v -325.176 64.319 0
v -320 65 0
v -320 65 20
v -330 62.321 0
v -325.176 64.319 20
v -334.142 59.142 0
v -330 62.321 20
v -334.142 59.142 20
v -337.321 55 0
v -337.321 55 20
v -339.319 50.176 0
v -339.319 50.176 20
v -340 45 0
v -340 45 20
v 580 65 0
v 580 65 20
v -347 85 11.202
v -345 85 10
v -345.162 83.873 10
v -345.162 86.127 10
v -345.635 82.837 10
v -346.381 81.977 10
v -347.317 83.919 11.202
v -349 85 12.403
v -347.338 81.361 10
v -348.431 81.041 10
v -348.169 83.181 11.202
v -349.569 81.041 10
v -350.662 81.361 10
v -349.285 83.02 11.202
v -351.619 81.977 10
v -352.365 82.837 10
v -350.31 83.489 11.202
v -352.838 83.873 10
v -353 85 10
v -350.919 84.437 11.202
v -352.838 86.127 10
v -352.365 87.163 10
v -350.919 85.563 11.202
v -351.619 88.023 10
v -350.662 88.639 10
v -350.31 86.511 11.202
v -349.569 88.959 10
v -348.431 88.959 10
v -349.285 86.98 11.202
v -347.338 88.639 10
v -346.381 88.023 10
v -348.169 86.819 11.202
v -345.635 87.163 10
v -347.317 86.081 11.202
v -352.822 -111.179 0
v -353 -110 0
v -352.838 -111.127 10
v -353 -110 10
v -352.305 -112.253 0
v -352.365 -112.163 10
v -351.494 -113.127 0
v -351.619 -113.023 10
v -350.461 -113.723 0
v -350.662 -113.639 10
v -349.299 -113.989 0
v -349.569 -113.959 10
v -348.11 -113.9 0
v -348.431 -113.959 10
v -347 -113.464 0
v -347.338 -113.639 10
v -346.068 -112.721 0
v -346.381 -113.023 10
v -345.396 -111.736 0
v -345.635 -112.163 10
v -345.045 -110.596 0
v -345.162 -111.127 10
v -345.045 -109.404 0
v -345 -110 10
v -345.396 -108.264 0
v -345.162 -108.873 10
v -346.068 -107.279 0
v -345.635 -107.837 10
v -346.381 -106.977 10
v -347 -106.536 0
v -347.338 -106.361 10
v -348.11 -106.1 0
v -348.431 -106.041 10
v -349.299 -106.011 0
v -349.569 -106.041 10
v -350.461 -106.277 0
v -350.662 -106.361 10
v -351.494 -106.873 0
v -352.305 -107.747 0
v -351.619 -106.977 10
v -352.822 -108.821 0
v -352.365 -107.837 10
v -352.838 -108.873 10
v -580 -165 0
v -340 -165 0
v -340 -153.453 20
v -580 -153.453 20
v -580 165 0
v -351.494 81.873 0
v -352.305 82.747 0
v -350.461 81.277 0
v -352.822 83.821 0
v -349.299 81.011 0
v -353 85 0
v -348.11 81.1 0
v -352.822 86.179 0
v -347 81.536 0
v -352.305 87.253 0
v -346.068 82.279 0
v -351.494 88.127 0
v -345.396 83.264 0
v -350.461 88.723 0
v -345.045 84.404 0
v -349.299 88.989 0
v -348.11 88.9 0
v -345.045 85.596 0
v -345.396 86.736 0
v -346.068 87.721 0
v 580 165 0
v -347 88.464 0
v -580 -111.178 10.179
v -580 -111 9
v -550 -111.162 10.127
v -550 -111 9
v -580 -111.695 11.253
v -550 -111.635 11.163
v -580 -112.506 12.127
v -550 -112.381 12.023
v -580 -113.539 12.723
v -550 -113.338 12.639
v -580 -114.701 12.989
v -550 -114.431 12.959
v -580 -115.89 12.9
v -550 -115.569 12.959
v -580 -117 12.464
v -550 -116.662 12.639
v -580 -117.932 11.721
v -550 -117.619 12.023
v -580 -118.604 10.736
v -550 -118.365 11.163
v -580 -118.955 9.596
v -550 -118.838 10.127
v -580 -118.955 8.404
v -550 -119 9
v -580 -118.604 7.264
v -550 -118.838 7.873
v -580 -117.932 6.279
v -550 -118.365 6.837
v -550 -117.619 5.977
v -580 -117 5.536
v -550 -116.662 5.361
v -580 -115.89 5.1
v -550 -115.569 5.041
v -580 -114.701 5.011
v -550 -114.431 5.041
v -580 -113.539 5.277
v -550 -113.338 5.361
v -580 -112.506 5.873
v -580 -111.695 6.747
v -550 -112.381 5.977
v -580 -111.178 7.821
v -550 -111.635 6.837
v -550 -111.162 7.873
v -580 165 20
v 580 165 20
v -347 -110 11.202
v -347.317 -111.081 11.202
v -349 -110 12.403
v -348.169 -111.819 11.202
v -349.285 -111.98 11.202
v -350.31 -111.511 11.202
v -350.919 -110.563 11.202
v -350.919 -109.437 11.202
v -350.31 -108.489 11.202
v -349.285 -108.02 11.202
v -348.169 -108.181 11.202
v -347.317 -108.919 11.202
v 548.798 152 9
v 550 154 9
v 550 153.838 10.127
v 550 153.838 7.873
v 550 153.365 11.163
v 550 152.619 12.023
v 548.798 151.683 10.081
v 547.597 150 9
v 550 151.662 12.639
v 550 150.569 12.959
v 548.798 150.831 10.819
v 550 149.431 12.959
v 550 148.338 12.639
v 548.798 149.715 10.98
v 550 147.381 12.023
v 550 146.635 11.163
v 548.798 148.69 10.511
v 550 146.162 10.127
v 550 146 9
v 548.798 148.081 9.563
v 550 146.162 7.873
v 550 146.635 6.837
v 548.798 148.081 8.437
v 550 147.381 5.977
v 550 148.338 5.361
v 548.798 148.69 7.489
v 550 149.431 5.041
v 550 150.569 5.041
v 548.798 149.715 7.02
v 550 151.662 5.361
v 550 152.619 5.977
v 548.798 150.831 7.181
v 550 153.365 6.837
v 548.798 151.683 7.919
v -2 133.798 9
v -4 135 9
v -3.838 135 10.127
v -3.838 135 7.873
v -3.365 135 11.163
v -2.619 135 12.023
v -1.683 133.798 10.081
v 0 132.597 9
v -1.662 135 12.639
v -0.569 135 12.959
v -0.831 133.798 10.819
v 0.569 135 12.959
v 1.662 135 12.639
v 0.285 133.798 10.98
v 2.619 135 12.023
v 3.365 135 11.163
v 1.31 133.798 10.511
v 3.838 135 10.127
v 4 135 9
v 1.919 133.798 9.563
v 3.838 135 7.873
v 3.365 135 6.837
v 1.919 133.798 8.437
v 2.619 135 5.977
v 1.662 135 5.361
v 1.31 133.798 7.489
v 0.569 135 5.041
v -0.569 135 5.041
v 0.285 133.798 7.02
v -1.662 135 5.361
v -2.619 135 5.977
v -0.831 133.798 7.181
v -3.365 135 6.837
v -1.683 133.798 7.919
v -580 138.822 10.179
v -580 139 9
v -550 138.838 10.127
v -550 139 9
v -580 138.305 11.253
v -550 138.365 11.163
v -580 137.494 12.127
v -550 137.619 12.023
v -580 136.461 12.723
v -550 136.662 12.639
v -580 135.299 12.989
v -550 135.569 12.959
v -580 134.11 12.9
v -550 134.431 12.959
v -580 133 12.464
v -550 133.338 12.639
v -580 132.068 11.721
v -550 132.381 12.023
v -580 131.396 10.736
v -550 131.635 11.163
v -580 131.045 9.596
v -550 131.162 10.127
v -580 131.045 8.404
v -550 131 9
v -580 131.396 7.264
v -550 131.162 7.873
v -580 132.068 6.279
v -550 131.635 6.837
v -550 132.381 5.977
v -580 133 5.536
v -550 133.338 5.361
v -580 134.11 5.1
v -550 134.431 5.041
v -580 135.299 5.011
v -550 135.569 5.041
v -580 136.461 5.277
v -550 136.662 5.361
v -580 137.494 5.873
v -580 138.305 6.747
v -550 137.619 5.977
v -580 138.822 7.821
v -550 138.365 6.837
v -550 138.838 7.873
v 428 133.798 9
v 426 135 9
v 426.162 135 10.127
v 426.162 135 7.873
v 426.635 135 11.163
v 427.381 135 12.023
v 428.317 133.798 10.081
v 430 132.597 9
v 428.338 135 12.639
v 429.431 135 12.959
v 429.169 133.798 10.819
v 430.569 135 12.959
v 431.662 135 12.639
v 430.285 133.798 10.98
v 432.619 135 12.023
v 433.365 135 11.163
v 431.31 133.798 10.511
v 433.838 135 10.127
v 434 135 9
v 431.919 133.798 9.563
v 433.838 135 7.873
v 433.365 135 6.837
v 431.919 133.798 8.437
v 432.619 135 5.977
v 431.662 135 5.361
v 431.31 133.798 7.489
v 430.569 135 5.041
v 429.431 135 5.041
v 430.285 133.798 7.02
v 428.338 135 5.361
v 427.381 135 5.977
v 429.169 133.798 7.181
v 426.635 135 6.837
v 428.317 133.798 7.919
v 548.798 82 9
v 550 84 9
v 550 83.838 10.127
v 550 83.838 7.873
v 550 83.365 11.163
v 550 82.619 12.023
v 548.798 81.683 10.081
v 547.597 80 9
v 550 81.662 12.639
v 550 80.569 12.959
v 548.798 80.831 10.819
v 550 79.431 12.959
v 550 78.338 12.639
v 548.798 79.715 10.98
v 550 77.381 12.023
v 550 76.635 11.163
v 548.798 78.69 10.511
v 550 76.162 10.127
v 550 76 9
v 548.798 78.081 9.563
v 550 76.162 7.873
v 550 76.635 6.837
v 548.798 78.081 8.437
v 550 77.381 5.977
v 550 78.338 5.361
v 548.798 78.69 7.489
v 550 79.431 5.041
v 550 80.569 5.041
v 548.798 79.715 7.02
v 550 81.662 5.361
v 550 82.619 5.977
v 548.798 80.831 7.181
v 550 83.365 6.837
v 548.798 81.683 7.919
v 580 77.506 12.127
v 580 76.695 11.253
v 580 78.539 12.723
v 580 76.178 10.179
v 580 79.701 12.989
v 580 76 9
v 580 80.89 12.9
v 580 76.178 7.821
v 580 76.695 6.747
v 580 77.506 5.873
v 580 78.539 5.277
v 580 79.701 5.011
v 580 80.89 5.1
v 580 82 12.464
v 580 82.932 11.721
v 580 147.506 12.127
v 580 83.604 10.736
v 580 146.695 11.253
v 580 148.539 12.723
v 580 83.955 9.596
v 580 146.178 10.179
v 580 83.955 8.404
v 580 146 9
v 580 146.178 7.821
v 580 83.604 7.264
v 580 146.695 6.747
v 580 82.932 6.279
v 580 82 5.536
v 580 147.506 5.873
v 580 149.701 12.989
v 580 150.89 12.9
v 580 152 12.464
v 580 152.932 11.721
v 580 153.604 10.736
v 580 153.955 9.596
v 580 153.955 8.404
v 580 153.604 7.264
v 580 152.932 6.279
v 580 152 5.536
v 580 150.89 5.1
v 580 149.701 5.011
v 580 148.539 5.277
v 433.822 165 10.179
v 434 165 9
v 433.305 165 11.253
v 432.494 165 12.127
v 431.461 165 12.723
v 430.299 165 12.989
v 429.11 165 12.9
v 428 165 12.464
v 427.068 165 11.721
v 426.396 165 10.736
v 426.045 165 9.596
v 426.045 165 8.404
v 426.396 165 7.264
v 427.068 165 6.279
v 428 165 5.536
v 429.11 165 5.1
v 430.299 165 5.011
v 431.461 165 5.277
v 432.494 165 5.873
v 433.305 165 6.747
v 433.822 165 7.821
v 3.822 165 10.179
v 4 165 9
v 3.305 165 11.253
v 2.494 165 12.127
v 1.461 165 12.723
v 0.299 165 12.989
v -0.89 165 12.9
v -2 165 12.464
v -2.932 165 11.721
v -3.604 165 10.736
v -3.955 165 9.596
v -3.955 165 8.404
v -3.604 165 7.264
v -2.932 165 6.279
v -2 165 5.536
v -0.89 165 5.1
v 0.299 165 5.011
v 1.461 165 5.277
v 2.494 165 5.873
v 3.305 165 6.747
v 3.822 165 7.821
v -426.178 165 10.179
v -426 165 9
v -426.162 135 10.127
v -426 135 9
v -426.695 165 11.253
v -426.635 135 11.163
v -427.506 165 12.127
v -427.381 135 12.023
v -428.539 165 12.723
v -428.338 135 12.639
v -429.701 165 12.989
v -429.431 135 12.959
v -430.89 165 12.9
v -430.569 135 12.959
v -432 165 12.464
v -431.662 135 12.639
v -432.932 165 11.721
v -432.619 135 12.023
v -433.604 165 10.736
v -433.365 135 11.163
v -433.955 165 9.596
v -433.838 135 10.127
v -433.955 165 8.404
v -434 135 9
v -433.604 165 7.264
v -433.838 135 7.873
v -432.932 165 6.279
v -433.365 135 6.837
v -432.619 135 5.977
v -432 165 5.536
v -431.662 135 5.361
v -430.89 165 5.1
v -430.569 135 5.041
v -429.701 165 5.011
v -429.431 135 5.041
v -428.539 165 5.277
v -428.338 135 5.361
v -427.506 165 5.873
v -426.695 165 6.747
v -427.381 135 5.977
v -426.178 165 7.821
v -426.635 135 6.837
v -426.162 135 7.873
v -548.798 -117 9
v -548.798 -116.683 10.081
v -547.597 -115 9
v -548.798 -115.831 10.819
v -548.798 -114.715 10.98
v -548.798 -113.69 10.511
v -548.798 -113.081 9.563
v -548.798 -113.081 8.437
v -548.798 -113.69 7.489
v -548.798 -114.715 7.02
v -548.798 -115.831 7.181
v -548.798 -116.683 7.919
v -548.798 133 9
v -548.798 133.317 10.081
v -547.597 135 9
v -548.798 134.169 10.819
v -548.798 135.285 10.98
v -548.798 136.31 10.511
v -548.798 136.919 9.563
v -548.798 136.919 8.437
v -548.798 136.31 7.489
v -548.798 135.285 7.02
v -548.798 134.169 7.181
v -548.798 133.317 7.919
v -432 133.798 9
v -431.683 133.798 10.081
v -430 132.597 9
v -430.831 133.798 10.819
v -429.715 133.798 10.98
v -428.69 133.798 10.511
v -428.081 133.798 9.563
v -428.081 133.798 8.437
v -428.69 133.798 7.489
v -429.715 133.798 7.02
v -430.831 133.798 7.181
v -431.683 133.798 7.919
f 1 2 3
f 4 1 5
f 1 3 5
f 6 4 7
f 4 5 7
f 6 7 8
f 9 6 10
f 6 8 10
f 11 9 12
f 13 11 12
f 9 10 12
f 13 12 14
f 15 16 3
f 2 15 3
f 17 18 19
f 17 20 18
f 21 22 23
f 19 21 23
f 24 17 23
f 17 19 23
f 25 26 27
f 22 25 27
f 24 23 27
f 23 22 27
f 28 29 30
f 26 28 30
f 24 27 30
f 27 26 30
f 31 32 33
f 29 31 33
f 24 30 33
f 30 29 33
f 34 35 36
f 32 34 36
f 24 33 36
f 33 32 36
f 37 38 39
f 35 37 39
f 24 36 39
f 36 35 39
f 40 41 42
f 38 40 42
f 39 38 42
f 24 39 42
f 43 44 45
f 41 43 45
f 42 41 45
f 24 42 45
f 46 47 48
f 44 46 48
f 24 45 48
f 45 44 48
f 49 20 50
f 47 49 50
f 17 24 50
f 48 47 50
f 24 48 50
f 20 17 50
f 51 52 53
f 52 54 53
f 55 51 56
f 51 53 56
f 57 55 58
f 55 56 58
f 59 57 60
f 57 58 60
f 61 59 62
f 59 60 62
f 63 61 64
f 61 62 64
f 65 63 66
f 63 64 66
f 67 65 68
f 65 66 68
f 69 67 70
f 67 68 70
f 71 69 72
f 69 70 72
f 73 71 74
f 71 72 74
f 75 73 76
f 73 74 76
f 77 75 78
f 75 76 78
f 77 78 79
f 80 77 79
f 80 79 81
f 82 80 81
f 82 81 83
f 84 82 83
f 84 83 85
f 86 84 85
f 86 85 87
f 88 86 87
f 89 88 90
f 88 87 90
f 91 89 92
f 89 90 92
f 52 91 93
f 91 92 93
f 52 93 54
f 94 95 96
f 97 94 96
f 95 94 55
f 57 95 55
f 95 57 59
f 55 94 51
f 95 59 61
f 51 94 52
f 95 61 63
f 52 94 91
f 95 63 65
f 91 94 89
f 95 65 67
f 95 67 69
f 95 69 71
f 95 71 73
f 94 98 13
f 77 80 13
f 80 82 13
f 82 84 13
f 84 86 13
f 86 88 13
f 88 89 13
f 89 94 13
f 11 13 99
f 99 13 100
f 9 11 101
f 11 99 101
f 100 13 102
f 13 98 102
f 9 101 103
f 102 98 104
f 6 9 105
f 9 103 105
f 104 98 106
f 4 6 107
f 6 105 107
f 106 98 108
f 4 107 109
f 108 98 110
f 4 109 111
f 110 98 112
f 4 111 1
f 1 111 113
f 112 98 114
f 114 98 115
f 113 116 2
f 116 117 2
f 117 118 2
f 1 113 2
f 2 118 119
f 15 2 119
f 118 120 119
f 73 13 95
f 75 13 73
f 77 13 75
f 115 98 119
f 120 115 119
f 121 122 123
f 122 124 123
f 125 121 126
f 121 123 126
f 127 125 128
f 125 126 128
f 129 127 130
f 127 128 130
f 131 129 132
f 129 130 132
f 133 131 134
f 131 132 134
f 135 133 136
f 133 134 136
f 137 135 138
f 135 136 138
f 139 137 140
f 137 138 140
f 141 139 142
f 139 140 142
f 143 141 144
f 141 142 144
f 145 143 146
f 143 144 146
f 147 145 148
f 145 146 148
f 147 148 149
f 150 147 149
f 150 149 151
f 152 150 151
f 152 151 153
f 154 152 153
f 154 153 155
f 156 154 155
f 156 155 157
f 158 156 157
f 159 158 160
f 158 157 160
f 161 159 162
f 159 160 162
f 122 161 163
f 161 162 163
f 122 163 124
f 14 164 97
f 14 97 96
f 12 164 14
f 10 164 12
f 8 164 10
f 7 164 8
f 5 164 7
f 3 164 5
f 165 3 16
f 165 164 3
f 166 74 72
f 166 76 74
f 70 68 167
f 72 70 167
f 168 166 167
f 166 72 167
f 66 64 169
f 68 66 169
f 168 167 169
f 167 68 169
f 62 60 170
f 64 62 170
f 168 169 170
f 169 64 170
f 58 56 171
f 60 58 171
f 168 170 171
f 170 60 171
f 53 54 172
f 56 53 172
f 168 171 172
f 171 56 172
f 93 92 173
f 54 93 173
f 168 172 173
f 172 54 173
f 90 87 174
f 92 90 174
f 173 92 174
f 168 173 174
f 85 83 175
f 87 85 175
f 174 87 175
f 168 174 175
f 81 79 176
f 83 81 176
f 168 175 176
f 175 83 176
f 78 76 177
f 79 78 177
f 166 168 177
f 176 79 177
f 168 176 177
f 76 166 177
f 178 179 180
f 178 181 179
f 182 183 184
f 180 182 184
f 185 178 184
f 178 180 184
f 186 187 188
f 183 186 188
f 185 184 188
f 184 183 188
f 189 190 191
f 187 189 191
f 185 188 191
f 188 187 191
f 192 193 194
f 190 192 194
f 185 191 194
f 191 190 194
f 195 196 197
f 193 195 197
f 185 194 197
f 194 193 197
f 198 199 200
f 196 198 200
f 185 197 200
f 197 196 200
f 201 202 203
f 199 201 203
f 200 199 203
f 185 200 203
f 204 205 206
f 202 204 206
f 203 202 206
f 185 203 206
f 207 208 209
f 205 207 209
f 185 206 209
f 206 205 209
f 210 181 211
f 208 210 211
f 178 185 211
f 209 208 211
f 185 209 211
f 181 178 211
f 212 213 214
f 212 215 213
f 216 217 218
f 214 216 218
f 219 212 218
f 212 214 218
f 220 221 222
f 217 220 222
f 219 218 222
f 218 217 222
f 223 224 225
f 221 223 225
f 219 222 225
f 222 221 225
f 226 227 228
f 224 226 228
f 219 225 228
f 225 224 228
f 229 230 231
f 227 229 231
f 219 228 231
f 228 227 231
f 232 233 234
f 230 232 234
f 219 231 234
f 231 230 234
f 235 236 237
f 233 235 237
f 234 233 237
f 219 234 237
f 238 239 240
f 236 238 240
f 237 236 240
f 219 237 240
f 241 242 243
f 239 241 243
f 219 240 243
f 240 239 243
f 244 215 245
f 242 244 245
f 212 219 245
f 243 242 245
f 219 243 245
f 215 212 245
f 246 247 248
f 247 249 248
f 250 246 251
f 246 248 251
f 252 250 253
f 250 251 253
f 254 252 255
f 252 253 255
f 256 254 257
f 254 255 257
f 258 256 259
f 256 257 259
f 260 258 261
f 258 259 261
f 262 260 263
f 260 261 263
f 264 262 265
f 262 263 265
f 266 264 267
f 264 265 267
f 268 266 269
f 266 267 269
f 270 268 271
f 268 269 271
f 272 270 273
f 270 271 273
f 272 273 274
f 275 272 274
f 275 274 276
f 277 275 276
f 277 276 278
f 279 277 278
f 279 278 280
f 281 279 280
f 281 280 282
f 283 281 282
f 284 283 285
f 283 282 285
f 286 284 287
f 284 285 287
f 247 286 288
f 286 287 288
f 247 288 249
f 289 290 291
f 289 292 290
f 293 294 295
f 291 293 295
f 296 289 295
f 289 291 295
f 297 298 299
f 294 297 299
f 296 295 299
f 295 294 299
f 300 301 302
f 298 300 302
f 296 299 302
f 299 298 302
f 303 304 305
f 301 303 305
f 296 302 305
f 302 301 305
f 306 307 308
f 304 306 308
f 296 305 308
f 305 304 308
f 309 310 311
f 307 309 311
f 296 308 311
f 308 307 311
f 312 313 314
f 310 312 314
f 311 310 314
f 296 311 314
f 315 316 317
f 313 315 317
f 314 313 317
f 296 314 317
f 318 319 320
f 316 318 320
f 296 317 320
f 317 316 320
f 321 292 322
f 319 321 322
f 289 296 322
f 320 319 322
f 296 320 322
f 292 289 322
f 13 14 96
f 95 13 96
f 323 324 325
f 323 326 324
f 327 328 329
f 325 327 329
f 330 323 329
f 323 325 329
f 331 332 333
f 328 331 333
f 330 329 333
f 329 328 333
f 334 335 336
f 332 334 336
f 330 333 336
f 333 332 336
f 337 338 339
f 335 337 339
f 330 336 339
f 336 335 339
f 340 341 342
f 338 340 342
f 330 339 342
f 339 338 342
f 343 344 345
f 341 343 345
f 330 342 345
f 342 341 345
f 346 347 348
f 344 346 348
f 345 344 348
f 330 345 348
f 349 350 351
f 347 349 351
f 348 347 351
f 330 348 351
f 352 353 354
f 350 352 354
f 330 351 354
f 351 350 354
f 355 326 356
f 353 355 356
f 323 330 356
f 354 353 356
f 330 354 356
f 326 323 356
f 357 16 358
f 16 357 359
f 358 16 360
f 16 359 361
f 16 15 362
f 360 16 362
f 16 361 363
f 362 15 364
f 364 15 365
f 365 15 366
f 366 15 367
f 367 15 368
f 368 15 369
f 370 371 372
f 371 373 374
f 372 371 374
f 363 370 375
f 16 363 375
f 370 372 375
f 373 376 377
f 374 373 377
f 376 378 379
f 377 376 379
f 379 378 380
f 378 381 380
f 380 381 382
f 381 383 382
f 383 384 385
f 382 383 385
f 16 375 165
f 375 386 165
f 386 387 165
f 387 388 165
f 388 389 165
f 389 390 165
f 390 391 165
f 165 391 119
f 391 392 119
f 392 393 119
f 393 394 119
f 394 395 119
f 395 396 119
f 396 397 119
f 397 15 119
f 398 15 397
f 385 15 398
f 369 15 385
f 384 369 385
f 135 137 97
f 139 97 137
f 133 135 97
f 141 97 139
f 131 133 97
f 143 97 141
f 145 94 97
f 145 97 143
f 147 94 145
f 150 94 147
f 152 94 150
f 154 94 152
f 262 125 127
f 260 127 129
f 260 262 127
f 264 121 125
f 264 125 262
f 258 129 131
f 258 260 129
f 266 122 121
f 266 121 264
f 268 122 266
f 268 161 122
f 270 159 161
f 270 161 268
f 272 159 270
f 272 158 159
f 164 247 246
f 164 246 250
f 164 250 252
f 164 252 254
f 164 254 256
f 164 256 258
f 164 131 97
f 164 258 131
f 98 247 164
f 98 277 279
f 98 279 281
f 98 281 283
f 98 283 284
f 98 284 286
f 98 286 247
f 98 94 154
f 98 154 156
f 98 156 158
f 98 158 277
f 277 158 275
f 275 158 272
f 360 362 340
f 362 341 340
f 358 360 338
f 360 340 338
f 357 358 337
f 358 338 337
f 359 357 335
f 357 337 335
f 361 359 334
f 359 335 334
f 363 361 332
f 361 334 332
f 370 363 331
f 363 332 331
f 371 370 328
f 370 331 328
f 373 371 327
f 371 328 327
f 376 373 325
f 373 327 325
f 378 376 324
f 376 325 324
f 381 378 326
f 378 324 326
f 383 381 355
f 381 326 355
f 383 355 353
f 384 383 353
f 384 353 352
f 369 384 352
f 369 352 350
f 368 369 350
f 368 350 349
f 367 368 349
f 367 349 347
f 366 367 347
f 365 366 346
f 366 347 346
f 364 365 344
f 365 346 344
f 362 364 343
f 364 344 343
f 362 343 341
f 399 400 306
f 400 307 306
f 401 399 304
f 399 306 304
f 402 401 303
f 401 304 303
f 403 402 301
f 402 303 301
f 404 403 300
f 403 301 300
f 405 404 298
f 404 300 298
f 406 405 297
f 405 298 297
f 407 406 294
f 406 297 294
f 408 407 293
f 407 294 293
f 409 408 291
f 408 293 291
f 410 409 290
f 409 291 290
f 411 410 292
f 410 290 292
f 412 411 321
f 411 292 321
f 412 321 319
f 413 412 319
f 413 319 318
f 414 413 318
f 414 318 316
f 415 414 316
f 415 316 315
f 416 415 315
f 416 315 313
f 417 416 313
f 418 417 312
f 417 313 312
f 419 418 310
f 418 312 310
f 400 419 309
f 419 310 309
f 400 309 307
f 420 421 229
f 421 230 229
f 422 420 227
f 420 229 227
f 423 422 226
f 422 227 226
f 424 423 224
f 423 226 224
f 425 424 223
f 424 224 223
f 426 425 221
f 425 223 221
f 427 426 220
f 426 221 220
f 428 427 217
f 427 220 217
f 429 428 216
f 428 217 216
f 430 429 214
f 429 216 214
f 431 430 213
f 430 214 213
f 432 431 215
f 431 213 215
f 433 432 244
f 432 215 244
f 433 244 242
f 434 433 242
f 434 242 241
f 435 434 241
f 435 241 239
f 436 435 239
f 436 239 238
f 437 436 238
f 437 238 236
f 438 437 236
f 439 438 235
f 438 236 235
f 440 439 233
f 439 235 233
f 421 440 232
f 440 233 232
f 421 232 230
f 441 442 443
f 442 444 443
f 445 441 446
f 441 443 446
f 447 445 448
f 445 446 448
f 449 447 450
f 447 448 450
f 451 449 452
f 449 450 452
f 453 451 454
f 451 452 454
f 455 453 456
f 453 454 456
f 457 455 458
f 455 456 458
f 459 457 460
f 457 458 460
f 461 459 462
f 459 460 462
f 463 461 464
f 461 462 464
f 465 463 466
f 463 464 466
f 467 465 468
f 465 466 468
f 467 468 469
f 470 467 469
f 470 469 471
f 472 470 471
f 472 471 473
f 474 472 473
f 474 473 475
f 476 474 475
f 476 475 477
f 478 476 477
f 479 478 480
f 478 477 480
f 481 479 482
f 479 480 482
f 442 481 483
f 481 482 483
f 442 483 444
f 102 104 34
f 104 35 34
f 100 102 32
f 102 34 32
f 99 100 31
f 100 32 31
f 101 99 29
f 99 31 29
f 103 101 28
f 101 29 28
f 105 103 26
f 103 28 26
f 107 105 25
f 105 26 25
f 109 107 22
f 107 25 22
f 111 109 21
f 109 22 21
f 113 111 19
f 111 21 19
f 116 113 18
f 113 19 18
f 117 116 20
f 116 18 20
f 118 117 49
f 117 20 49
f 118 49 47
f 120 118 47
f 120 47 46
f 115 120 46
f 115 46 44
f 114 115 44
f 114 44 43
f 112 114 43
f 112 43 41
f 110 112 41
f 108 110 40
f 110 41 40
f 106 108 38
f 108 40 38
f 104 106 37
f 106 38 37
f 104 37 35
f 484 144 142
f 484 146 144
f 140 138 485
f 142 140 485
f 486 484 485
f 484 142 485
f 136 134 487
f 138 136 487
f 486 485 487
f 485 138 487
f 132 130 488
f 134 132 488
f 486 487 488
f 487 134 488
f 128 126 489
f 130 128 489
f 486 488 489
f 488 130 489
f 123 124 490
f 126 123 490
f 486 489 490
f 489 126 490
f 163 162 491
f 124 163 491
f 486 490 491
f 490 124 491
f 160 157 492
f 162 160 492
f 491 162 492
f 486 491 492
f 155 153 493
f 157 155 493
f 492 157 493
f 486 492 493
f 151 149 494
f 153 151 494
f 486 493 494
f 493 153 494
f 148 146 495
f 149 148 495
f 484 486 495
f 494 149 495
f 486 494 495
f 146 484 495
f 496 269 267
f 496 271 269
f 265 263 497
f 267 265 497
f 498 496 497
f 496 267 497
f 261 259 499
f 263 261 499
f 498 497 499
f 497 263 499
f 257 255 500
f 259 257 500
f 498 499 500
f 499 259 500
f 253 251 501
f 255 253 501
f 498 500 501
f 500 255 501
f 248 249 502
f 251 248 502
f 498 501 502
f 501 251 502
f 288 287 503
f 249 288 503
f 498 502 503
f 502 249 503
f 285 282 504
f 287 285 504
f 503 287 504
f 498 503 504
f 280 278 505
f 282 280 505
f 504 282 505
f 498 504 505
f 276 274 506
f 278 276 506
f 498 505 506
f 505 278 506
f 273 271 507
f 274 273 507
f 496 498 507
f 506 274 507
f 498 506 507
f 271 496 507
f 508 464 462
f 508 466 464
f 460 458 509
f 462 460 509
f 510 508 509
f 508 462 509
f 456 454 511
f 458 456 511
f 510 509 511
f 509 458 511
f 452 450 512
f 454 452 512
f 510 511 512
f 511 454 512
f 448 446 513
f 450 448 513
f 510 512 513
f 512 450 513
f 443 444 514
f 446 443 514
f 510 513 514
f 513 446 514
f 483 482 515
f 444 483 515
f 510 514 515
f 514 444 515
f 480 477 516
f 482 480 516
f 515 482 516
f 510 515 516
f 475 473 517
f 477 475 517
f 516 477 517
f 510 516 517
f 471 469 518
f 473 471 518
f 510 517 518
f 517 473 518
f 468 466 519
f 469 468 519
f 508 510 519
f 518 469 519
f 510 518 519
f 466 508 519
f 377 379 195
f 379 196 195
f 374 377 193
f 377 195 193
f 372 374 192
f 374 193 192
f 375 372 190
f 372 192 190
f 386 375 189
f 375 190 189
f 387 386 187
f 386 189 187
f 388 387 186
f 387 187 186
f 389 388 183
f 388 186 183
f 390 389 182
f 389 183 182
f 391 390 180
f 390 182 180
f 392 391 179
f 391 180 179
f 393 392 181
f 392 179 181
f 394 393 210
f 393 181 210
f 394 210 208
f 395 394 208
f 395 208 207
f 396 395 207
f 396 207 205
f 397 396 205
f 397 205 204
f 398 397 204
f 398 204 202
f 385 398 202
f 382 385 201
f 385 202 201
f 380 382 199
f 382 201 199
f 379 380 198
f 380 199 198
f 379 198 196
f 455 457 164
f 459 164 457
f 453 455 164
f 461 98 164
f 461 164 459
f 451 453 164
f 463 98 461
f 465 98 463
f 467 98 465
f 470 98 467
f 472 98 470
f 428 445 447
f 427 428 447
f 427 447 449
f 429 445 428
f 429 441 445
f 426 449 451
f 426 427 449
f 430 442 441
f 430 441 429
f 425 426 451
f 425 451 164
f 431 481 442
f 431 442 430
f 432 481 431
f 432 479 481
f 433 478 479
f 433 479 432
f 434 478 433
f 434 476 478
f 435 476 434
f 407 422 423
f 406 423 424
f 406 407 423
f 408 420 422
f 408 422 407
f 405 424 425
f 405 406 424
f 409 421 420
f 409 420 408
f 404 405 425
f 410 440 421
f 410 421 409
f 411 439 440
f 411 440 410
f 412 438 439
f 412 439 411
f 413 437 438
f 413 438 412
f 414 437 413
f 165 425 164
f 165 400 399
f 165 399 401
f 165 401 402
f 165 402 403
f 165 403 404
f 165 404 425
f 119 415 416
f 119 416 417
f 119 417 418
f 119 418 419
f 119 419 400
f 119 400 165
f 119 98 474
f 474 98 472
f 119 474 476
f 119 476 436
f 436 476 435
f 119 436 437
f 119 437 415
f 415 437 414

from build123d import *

# Parameters (mm, degrees)
F0_W            = 1160
F0_H            = 330
F1_DEPTH        = 20
F3_DEPTH        = 20.001
F5_DEPTH        = 580.001
F10_D           = 8
F10_DEPTH       = 30
F10_TIP         = 2.4034424761
F10_ON_F7_D     = 8
F10_ON_F7_DEPTH = 30
F10_ON_F7_TIP   = 2.4034424761
F10_ON_F8_D     = 8
F10_ON_F8_DEPTH = 30
F10_ON_F8_TIP   = 2.4034424761
F11_D           = 8
F11_DEPTH       = 10
F11_TIP         = 2.4034424761


with BuildPart() as f1:
    # F0 (on Top) → F1 (new body)
    with BuildSketch(Plane.XY):
        Rectangle(F0_W, F0_H)
    extrude(amount=F1_DEPTH)

    # F2 (on face) → F3 (cut, through all)
    with BuildSketch(Plane.XY.offset(20)):
        with BuildLine():
            Line((-340, 45), (-340, -165))
            Line((-340, -165), (580, -165))
            Line((580, -165), (580, 65))
            Line((580, 65), (-320, 65))
            ThreePointArc((-320, 65), (-334.1421356237, 59.1421356237), (-340, 45))
        make_face()
    extrude(amount=-F3_DEPTH, mode=Mode.SUBTRACT)

    # F4 (on Right) → F5 (cut, through all)
    with BuildSketch(Plane.YZ):
        Polygon((-165, 20), (-165, 0), (-153.4529946162, 20), align=None)
    extrude(amount=-F5_DEPTH, mode=Mode.SUBTRACT)

    # F10
    with Locations(Plane(origin=(-580, 0, 0), x_dir=(0, -1, 0), z_dir=(-1, 0, 0))):
        with Locations((-135, 9), (115, 9)):
            Hole(F10_D / 2, depth=F10_DEPTH)
            with Locations((0, 0, -(F10_DEPTH + F10_TIP / 2))):  # 118° drill point
                Cone(0, F10_D / 2, F10_TIP, mode=Mode.SUBTRACT)

    # F10 on F7
    with Locations(Plane(origin=(0, 165, 0), x_dir=(-1, 0, 0), z_dir=(0, 1, 0))):
        with Locations((-430, 9), (0, 9), (430, 9)):
            Hole(F10_ON_F7_D / 2, depth=F10_ON_F7_DEPTH)
            with Locations((0, 0, -(F10_ON_F7_DEPTH + F10_ON_F7_TIP / 2))):  # 118° drill point
                Cone(0, F10_ON_F7_D / 2, F10_ON_F7_TIP, mode=Mode.SUBTRACT)

    # F10 on F8
    with Locations(Plane.YZ.offset(580)):
        with Locations((80, 9), (150, 9)):
            Hole(F10_ON_F8_D / 2, depth=F10_ON_F8_DEPTH)
            with Locations((0, 0, -(F10_ON_F8_DEPTH + F10_ON_F8_TIP / 2))):  # 118° drill point
                Cone(0, F10_ON_F8_D / 2, F10_ON_F8_TIP, mode=Mode.SUBTRACT)

    # F11
    with Locations(Plane(origin=(0, 0, 0), x_dir=(1, 0, 0), z_dir=(0, 0, -1))):
        with Locations((-349, -85), (-349, 110)):
            Hole(F11_D / 2, depth=F11_DEPTH)
            with Locations((0, 0, -(F11_DEPTH + F11_TIP / 2))):  # 118° drill point
                Cone(0, F11_D / 2, F11_TIP, mode=Mode.SUBTRACT)


solid = f1.part
